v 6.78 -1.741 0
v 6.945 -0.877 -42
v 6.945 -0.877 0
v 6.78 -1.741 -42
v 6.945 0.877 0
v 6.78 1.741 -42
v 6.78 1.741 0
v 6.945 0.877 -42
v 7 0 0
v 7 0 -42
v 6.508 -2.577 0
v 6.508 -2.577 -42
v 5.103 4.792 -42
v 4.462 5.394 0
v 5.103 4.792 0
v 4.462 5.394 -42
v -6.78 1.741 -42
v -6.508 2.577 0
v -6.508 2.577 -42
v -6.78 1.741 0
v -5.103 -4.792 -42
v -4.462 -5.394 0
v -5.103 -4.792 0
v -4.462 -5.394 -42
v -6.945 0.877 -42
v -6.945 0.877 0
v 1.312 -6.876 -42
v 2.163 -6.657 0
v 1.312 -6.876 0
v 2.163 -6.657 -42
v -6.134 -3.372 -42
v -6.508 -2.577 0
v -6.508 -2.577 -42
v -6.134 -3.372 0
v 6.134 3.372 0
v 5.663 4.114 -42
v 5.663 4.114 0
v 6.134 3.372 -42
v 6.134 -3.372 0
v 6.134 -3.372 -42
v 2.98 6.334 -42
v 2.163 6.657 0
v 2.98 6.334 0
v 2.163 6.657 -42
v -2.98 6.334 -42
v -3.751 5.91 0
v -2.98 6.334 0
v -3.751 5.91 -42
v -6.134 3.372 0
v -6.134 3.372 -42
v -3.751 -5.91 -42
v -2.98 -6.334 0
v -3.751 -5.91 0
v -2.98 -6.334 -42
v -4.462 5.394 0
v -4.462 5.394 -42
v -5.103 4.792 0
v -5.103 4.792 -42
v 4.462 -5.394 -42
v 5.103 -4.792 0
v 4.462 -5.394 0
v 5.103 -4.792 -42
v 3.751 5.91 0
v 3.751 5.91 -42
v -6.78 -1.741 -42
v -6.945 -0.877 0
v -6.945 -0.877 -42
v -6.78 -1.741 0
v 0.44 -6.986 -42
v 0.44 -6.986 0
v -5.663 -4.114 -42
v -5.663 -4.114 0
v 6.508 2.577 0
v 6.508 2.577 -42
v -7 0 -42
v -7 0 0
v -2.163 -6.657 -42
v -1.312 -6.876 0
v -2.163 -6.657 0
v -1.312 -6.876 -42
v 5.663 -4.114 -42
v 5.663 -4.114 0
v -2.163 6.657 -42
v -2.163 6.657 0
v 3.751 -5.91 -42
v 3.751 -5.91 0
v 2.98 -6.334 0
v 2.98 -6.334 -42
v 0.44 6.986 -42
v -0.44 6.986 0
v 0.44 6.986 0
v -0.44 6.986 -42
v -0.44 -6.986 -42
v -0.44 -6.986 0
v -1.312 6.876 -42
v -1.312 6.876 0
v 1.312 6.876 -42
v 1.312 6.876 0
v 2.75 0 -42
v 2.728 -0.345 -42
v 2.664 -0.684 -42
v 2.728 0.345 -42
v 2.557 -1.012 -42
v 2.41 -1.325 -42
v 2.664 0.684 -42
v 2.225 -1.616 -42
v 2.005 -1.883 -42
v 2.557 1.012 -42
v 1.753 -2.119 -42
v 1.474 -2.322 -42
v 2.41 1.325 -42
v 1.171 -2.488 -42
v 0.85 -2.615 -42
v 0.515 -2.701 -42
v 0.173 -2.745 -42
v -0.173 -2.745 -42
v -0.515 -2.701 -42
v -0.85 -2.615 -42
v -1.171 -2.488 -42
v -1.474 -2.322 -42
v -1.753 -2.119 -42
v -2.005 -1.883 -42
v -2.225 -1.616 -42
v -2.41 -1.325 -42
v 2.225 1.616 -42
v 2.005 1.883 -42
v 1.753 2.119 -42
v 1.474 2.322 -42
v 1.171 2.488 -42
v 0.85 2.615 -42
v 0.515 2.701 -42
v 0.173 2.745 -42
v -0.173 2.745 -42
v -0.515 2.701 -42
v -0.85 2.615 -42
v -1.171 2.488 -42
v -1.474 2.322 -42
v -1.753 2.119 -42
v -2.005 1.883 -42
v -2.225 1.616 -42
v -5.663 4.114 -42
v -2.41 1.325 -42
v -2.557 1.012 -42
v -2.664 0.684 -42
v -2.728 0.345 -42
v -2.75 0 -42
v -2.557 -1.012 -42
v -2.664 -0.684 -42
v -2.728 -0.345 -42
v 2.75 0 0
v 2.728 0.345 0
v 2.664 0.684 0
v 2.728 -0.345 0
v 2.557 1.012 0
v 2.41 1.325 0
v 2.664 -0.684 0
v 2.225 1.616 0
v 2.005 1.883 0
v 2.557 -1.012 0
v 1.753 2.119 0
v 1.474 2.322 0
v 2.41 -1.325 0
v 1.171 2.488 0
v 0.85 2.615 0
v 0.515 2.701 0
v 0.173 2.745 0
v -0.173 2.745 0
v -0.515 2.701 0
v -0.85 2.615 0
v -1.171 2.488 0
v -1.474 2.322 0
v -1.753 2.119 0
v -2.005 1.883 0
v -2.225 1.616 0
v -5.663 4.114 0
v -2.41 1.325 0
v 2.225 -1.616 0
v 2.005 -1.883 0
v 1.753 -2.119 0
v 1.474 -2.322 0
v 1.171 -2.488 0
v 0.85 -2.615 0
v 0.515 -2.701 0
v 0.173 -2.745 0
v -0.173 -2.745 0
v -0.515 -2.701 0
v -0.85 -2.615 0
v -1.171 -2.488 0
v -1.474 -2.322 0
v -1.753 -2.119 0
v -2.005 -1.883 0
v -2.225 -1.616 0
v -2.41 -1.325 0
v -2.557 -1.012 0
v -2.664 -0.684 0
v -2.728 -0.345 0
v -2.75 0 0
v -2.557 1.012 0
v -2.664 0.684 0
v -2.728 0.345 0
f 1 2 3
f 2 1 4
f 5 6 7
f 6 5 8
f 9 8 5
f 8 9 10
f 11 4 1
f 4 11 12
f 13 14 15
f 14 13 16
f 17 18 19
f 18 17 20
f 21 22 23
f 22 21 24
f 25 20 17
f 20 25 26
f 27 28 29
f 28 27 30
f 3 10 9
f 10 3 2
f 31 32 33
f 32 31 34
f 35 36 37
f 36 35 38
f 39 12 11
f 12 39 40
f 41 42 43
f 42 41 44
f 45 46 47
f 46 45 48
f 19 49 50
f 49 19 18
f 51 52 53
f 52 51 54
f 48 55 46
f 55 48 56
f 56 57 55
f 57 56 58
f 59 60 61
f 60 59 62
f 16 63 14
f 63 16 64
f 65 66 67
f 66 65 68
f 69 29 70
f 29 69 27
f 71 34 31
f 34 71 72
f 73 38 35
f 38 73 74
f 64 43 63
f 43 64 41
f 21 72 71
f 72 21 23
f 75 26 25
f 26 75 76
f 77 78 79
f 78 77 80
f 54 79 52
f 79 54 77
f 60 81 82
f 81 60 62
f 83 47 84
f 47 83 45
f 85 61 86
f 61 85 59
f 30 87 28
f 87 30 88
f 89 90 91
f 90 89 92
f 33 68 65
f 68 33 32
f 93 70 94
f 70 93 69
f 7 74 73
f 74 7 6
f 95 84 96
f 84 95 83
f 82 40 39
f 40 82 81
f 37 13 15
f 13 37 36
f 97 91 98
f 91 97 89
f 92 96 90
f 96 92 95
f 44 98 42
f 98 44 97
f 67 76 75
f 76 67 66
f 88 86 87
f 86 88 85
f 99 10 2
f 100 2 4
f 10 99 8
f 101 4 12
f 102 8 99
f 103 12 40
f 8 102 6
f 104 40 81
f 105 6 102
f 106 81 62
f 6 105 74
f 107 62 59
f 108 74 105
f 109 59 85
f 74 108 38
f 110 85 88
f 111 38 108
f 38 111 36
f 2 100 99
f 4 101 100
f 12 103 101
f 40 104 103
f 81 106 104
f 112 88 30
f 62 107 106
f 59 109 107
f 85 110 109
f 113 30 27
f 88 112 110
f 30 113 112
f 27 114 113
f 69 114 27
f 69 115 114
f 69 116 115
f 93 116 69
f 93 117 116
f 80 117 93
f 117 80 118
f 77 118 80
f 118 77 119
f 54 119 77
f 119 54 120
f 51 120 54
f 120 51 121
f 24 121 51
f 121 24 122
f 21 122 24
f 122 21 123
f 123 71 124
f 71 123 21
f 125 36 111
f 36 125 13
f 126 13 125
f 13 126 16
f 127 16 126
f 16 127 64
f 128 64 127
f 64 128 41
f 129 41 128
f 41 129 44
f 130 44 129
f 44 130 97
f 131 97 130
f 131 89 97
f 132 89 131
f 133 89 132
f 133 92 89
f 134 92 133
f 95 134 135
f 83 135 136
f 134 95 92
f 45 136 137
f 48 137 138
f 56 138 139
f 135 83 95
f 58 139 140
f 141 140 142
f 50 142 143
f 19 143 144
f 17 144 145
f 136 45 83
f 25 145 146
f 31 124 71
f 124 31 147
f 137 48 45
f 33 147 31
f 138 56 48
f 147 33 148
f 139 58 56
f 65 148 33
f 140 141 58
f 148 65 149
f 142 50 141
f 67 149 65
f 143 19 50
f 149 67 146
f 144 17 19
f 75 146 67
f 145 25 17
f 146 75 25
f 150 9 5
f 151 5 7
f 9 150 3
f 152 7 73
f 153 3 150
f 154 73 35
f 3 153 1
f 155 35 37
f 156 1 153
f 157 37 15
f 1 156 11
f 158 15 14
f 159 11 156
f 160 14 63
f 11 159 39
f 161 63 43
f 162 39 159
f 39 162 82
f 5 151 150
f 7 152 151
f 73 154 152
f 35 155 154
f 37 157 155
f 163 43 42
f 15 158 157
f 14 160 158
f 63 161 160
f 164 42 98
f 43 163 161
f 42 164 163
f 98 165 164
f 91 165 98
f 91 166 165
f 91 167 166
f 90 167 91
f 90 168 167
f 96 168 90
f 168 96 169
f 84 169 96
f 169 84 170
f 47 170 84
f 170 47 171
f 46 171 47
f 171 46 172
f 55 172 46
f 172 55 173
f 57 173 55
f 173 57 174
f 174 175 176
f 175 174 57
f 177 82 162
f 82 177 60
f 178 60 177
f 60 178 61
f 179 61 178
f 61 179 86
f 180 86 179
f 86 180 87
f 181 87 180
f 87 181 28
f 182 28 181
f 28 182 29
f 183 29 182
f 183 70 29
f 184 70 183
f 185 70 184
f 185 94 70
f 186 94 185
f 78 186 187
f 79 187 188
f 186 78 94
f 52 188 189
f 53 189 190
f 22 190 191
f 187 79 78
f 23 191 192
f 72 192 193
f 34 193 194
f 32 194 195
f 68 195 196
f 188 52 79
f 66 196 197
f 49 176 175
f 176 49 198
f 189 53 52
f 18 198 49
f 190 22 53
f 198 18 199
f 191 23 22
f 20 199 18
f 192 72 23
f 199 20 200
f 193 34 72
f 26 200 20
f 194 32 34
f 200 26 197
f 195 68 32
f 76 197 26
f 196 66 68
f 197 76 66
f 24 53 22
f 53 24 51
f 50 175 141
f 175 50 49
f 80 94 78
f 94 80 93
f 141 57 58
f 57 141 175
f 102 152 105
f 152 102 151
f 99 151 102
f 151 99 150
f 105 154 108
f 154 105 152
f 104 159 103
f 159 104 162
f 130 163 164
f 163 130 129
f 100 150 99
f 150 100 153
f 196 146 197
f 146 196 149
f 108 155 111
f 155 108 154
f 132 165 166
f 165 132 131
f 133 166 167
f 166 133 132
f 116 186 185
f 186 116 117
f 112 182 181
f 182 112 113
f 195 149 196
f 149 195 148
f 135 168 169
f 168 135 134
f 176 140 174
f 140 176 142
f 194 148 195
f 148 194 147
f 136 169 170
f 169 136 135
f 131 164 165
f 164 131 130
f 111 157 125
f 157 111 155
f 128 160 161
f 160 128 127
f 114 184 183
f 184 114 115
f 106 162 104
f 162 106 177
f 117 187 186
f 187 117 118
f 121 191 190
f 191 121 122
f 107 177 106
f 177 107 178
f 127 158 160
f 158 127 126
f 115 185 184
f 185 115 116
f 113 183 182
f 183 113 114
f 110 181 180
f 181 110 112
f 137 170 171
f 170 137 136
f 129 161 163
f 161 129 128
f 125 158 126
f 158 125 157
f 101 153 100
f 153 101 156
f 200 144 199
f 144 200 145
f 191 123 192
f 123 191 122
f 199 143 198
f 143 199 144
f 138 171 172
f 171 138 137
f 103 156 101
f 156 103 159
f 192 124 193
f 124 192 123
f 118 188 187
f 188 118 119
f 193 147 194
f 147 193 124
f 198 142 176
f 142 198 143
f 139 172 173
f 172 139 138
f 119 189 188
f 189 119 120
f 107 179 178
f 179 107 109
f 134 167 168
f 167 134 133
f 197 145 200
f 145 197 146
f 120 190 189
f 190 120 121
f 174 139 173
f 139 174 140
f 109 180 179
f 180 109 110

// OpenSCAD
$fn = 50;


difference() {
	union() {
		translate(v = [0, 0, -42.0000000000]) {
			cylinder(h = 42, r = 7.0000000000);
		}
		cylinder(h = 0, r = 16.0000000000);
	}
	union() {
		#translate(v = [0, 0, -42]) {
			cylinder(h = 42, r = 2.7500000000);
		}
	}
}
